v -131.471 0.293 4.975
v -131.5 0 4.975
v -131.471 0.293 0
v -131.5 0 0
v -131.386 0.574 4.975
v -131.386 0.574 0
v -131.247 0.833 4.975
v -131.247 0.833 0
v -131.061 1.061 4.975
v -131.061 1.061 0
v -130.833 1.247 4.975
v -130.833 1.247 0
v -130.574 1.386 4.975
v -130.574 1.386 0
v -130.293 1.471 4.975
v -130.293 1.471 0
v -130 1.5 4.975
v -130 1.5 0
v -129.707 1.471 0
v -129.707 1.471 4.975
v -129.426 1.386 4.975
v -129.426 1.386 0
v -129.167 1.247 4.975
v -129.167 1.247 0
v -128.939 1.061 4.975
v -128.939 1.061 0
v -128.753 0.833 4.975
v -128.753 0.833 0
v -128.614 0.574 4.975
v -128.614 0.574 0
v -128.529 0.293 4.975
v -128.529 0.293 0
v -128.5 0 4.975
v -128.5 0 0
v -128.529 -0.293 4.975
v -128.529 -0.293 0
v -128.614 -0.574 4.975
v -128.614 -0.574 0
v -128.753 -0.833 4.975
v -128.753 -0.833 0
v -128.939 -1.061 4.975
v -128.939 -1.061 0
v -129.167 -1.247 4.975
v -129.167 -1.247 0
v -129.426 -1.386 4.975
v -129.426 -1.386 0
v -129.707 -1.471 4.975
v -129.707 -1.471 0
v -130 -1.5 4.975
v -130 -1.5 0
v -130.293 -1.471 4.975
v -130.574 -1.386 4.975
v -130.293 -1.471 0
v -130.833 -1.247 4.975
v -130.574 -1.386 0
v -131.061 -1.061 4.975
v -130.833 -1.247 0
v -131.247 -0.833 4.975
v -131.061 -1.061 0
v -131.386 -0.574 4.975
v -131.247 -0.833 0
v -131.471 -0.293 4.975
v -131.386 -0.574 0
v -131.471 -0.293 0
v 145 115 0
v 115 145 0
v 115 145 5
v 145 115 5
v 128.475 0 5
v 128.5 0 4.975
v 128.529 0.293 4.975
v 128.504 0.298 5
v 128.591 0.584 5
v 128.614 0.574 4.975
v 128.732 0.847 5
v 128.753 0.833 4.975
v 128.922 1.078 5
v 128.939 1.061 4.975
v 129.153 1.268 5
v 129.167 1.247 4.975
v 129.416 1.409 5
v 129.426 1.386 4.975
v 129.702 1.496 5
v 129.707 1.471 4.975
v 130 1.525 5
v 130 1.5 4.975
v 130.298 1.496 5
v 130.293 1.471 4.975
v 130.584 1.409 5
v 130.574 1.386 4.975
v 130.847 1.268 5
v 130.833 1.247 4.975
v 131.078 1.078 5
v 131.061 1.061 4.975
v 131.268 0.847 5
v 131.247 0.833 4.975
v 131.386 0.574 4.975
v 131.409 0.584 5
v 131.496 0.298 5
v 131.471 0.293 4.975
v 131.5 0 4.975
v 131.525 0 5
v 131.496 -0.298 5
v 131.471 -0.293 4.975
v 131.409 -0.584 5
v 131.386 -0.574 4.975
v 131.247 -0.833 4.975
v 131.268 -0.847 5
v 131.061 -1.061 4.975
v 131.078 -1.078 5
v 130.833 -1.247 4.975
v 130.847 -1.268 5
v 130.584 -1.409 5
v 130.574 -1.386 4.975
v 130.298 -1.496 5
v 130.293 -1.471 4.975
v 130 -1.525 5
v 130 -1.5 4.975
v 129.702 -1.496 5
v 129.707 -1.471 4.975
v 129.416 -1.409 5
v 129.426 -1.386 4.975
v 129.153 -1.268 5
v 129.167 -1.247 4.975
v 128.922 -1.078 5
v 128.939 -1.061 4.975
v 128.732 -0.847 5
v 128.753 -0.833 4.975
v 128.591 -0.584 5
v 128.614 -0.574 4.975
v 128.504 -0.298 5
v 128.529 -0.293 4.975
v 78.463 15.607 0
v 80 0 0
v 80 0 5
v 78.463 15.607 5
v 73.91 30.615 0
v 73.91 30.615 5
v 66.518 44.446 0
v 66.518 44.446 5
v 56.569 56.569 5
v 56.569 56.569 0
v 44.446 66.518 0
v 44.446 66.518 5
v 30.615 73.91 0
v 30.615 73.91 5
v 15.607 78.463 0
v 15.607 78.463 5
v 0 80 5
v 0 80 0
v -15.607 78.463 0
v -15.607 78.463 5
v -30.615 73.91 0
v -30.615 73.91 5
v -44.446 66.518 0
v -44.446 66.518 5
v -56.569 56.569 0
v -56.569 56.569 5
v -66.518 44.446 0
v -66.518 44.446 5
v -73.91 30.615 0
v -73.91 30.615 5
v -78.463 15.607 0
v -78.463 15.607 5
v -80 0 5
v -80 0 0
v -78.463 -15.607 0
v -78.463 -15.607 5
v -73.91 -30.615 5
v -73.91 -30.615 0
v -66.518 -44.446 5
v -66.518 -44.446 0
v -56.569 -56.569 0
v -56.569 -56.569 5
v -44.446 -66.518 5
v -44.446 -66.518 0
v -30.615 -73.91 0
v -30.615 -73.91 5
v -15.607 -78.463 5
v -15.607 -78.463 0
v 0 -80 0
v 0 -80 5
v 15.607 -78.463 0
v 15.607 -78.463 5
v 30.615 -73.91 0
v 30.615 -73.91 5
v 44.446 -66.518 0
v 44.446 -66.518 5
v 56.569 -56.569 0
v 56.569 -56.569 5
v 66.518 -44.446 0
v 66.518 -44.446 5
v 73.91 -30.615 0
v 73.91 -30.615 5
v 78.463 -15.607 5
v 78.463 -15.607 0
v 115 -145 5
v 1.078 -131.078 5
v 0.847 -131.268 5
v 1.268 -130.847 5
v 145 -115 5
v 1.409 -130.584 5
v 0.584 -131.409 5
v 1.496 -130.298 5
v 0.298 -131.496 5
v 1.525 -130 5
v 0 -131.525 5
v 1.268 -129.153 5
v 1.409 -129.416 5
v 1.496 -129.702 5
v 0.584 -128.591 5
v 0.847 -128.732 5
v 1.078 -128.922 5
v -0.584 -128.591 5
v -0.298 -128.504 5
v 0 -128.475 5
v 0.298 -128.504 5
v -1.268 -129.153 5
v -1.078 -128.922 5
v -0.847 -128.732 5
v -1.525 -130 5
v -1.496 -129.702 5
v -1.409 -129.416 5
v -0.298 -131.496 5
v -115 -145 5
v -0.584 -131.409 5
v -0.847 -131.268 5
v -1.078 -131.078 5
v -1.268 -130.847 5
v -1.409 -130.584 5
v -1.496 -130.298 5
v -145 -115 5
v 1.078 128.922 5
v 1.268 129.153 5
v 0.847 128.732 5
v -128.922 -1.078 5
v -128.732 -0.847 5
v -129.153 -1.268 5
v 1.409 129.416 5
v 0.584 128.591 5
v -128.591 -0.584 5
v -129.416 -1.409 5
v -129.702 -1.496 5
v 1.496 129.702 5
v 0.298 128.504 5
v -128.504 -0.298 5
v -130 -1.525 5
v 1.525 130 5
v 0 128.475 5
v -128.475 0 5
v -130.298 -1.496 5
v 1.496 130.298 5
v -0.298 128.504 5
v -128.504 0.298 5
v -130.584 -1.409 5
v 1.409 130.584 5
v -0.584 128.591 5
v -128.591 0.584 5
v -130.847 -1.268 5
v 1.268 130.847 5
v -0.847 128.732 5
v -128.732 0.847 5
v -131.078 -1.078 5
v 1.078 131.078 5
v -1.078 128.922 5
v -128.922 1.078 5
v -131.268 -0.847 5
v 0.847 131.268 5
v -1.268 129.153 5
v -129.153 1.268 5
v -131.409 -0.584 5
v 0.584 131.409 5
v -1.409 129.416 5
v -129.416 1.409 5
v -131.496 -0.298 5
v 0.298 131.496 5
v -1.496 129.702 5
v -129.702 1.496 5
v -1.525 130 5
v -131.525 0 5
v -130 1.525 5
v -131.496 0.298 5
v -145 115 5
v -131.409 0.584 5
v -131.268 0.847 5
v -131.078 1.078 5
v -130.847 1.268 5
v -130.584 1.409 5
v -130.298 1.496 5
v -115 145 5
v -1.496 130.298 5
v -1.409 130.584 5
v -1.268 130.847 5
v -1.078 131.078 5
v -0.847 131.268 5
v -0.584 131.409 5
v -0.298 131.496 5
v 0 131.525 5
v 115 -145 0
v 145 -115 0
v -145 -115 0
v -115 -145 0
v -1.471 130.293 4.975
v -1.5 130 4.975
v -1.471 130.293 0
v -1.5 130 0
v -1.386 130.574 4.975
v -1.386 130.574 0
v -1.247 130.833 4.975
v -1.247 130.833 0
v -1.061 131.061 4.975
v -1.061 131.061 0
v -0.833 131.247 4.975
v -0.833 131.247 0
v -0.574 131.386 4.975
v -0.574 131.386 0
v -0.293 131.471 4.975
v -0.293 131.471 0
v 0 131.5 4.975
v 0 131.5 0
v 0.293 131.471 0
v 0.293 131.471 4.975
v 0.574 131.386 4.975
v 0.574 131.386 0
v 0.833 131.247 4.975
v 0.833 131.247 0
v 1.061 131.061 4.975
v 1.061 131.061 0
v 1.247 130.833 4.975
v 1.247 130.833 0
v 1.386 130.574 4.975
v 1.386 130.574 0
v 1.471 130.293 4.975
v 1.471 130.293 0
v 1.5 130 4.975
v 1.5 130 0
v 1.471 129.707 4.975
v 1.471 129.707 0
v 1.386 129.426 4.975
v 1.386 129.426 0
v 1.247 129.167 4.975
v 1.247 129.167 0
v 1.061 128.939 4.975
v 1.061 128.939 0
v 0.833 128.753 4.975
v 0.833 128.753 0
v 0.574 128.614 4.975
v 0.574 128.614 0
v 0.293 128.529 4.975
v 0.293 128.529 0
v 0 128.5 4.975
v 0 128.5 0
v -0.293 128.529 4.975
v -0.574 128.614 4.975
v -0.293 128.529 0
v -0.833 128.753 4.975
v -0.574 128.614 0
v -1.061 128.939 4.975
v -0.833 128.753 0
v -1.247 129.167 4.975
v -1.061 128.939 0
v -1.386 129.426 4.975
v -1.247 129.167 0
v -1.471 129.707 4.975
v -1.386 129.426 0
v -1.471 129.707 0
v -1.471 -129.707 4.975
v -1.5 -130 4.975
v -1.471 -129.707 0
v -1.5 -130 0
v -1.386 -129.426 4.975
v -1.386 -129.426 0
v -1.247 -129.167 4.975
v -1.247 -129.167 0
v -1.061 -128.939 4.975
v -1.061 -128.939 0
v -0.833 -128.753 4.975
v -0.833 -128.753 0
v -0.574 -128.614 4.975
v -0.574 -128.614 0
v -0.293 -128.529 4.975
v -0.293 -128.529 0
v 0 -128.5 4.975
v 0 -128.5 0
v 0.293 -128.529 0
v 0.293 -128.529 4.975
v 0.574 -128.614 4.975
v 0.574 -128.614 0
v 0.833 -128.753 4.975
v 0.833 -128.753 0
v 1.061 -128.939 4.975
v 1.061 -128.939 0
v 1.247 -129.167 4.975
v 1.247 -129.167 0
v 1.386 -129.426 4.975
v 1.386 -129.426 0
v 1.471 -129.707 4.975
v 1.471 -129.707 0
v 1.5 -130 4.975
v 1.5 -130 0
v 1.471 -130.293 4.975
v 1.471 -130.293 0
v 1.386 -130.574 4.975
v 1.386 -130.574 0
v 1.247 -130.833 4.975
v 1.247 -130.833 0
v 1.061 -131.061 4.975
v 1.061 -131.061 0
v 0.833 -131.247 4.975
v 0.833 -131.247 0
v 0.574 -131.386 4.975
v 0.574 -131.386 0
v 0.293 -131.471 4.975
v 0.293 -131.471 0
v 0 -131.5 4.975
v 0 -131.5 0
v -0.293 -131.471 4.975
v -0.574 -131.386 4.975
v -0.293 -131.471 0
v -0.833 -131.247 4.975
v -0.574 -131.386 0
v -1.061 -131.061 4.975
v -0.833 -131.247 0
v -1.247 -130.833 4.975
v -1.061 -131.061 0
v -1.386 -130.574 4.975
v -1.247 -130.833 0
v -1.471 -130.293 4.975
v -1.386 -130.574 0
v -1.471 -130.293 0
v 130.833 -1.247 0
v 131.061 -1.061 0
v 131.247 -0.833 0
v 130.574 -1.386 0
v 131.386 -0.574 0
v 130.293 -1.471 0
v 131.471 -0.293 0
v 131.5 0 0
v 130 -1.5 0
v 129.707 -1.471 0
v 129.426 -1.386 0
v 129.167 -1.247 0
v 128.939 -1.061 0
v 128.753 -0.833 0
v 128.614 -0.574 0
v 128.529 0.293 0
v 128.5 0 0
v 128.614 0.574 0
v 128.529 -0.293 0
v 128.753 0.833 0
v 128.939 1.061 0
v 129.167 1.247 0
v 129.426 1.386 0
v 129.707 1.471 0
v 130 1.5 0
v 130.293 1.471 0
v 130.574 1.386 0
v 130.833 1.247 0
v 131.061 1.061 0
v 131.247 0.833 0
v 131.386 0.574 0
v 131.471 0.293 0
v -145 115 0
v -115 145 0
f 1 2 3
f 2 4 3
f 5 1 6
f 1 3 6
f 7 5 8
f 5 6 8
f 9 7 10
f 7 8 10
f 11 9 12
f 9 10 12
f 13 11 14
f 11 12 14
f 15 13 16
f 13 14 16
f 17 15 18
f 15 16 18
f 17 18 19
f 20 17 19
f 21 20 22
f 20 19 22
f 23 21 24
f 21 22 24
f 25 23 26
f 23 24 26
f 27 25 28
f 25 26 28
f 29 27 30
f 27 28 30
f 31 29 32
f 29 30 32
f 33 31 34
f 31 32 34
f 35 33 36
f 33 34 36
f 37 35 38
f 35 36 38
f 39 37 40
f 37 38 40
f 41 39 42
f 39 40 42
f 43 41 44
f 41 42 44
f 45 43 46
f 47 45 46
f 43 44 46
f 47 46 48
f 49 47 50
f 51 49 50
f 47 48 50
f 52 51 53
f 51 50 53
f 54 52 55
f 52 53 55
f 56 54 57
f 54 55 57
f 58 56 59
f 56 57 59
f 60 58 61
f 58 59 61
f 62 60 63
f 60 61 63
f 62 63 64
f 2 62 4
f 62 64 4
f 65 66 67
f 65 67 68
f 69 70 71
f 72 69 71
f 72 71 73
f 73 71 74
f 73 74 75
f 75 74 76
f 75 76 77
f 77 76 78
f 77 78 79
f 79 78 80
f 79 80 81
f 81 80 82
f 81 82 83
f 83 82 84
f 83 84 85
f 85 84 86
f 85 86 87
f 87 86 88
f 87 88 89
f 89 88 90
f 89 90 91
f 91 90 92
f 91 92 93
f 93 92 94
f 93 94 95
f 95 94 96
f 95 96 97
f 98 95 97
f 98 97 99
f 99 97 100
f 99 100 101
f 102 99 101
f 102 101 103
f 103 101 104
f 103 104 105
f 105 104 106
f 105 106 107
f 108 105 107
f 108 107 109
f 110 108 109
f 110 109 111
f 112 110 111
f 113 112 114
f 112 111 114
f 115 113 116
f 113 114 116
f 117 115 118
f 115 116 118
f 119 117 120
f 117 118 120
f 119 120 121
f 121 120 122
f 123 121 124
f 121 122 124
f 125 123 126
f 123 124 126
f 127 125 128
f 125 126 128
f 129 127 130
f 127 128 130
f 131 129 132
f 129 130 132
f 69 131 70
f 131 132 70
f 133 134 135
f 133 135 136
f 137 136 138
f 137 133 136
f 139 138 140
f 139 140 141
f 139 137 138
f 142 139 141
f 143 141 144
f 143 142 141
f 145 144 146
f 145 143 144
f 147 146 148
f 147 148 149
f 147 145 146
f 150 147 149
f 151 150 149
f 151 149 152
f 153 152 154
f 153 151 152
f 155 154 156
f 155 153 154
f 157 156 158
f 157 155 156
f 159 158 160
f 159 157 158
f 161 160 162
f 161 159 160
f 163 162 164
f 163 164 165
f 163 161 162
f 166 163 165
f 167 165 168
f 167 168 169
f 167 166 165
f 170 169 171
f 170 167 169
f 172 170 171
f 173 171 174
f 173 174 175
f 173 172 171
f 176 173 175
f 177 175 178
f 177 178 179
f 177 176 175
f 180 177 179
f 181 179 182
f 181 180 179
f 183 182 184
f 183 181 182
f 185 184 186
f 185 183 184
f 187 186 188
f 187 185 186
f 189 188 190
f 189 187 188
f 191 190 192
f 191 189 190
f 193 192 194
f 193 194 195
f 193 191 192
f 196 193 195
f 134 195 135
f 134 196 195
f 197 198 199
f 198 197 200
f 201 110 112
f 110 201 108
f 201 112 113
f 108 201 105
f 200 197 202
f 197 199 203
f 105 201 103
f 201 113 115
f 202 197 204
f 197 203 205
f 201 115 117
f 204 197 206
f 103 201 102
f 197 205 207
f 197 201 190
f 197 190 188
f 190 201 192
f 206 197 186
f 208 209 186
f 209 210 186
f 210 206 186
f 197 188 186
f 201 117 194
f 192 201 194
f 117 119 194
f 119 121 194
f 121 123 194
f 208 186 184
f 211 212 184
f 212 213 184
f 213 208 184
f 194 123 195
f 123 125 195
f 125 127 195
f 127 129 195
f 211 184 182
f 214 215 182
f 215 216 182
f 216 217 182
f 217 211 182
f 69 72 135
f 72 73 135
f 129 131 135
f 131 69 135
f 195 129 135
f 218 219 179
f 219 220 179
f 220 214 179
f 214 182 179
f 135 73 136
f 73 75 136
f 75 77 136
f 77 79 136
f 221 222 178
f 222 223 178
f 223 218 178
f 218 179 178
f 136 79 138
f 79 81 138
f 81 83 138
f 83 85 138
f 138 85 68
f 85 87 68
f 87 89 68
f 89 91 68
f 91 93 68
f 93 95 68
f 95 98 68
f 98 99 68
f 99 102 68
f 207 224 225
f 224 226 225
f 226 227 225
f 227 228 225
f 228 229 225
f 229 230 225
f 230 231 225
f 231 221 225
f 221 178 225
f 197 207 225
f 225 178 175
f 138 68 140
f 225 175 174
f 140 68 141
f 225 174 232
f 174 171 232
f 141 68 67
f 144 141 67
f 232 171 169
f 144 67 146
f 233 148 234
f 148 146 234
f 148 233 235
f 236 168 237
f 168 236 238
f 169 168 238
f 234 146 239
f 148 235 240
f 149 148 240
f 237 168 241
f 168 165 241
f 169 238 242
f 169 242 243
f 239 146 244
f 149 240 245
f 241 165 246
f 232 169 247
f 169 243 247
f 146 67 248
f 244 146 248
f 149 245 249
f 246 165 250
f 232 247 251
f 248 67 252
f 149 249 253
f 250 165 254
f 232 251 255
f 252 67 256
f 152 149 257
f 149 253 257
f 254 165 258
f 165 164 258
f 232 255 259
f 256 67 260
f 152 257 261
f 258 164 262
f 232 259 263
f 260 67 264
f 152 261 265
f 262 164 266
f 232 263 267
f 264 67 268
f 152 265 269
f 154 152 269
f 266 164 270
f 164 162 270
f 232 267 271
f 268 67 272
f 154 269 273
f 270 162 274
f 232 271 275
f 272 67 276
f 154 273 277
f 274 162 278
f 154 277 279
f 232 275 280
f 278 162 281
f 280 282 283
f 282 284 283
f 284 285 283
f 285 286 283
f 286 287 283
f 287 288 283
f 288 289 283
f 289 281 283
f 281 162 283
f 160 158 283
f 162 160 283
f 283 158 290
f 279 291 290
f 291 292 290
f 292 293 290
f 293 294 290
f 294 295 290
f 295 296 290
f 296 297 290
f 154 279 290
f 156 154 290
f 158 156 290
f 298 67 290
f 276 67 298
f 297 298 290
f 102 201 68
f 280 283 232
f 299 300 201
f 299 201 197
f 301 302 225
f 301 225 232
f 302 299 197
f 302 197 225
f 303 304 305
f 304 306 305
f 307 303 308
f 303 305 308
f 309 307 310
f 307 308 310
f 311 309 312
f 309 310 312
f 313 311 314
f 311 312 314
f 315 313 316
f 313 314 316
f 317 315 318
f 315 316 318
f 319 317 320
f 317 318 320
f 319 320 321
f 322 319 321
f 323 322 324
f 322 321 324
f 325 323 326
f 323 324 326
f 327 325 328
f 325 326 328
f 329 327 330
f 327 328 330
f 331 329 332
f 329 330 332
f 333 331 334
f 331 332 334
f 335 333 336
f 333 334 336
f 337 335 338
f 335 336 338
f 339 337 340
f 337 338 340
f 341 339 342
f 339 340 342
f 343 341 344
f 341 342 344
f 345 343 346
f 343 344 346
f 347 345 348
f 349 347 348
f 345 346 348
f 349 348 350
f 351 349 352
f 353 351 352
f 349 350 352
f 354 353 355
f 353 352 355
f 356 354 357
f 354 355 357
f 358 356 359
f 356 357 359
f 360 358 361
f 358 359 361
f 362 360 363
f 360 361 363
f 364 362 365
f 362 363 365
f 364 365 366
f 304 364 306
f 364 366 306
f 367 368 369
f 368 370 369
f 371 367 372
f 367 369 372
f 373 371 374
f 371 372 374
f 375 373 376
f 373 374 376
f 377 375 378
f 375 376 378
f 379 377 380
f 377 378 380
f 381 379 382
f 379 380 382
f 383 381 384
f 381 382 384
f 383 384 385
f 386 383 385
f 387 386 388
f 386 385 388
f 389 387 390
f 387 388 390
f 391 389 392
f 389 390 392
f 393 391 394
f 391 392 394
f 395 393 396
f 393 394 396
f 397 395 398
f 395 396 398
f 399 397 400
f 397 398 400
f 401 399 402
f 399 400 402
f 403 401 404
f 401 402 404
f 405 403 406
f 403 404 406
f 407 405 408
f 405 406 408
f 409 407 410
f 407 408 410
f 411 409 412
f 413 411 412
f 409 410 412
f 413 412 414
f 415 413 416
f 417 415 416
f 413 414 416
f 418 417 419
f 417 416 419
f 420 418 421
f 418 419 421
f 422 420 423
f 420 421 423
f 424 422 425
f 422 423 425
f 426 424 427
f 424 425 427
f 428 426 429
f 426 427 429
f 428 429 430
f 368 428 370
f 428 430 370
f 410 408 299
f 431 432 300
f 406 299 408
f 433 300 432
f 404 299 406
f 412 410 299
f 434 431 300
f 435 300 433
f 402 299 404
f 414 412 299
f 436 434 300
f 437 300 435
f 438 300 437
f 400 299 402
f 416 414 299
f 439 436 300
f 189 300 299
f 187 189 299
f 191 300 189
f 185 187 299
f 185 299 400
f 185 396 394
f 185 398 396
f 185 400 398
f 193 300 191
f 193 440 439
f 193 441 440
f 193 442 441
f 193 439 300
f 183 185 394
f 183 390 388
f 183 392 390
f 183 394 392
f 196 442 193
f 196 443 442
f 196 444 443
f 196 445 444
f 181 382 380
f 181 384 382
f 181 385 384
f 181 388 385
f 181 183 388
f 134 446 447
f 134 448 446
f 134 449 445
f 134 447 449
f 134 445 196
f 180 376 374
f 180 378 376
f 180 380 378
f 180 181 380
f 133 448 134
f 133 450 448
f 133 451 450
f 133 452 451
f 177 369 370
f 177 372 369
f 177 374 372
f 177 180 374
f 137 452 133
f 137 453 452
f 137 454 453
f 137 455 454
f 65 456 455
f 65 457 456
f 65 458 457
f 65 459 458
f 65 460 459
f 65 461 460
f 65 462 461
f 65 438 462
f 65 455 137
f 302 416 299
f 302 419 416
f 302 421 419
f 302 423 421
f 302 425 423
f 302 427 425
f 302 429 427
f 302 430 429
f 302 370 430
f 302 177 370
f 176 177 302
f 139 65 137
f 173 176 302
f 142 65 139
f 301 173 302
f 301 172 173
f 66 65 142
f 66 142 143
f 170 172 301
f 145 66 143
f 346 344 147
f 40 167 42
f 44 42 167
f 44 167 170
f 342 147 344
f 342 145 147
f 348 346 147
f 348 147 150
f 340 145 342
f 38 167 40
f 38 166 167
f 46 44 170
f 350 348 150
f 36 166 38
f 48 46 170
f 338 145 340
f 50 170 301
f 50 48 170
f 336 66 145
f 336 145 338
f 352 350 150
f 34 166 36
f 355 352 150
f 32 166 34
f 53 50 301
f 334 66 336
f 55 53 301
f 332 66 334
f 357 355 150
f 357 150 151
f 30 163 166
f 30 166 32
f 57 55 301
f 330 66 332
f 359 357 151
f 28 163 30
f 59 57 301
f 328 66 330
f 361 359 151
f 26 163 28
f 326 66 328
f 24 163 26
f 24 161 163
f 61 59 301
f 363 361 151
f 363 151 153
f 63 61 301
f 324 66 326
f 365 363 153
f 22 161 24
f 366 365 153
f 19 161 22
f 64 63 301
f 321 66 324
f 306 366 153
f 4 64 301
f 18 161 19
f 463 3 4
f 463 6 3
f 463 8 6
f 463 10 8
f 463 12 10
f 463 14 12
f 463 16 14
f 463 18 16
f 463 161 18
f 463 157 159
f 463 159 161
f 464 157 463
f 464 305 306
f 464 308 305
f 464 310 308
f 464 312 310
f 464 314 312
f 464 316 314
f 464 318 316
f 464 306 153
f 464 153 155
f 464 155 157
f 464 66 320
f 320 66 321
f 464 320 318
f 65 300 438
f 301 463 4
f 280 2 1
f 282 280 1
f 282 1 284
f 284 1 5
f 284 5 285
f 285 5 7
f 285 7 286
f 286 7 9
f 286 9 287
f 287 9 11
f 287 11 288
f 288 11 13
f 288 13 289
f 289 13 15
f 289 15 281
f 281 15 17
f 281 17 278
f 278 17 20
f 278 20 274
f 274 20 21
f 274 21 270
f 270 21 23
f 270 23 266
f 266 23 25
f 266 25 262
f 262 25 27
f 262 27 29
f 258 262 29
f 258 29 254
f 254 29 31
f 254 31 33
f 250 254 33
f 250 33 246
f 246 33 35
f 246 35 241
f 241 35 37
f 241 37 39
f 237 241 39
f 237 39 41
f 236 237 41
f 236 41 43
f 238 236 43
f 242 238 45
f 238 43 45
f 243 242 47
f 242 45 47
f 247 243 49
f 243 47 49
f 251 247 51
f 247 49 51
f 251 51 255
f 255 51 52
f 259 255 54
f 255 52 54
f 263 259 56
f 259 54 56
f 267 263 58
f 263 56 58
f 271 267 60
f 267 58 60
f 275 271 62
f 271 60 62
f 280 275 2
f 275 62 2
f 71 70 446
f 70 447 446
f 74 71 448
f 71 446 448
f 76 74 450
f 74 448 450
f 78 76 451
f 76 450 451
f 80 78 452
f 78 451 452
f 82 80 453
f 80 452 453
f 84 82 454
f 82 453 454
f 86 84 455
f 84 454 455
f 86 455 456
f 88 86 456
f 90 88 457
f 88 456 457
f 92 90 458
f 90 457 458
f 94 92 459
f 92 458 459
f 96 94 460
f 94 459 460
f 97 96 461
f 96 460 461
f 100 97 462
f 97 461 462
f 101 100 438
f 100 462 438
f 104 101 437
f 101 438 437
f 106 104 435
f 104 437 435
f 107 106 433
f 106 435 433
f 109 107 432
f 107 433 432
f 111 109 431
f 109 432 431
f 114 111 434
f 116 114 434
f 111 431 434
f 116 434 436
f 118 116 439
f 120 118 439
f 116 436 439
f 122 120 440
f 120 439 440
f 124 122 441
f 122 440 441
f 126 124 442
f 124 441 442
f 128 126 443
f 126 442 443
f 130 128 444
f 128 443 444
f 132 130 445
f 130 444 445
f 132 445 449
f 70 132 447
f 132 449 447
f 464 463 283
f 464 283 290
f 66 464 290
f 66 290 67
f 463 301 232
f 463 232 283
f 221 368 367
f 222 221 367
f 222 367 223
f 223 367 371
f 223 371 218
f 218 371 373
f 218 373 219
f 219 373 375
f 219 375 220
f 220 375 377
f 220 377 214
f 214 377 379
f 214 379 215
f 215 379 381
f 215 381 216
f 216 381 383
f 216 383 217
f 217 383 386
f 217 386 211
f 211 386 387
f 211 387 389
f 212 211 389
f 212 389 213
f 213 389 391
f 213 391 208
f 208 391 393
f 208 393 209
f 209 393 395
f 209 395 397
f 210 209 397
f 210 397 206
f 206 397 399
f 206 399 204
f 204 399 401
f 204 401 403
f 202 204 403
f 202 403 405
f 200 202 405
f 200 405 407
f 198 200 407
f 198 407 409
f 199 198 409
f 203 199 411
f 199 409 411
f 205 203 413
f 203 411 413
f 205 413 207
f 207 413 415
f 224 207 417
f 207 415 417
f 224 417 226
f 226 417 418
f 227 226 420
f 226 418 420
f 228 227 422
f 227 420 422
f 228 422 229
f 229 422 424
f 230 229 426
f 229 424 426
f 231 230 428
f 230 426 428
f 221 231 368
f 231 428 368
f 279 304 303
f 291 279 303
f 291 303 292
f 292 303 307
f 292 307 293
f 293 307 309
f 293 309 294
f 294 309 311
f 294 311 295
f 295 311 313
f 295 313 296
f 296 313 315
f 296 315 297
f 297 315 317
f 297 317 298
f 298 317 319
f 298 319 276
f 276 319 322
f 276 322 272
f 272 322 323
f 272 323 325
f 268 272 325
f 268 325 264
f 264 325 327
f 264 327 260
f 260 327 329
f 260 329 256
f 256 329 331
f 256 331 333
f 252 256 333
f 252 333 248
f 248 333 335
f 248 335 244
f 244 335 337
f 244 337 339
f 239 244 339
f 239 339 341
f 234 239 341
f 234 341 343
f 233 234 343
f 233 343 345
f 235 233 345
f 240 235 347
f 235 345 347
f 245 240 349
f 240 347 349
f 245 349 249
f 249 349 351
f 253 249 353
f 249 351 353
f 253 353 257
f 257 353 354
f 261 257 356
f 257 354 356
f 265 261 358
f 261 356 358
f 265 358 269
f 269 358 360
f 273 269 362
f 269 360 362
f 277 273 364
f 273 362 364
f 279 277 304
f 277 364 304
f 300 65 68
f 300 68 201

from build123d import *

# Parameters (mm, degrees)
SKETCH1_R                       = 80
BOSS_EXTRUDE1_DEPTH             = 5
F_3_0MM_DOWEL_HOLE1_D           = 3
F_3_0MM_DOWEL_HOLE1_DEPTH       = 7.5
F_3_0MM_DOWEL_HOLE1_CSINK_D     = 3.05
F_3_0MM_DOWEL_HOLE1_CSINK_ANGLE = 90
F_3_0MM_DOWEL_HOLE1_TIP         = 0.901290929


with BuildPart() as part:
    # Sketch1 → Boss-Extrude1 (new body)
    with BuildSketch(Plane.XY):
        Polygon((-145, 115), (-115, 145), (115, 145), (145, 115), (145, -115), (115, -145), (-115, -145), (-145, -115), align=None)
        Circle(SKETCH1_R, mode=Mode.SUBTRACT)
    extrude(amount=BOSS_EXTRUDE1_DEPTH)

    # Ø3.0mm Dowel Hole1
    with Locations(Plane.XY.offset(5)):
        with Locations((0, 130), (130, 0), (0, -130), (-130, 0)):
            CounterSinkHole(F_3_0MM_DOWEL_HOLE1_D / 2, F_3_0MM_DOWEL_HOLE1_CSINK_D / 2, depth=F_3_0MM_DOWEL_HOLE1_DEPTH, counter_sink_angle=F_3_0MM_DOWEL_HOLE1_CSINK_ANGLE)
            with Locations((0, 0, -(F_3_0MM_DOWEL_HOLE1_DEPTH + F_3_0MM_DOWEL_HOLE1_TIP / 2))):  # 118° drill point
                Cone(0, F_3_0MM_DOWEL_HOLE1_D / 2, F_3_0MM_DOWEL_HOLE1_TIP, mode=Mode.SUBTRACT)


solid = part.part
